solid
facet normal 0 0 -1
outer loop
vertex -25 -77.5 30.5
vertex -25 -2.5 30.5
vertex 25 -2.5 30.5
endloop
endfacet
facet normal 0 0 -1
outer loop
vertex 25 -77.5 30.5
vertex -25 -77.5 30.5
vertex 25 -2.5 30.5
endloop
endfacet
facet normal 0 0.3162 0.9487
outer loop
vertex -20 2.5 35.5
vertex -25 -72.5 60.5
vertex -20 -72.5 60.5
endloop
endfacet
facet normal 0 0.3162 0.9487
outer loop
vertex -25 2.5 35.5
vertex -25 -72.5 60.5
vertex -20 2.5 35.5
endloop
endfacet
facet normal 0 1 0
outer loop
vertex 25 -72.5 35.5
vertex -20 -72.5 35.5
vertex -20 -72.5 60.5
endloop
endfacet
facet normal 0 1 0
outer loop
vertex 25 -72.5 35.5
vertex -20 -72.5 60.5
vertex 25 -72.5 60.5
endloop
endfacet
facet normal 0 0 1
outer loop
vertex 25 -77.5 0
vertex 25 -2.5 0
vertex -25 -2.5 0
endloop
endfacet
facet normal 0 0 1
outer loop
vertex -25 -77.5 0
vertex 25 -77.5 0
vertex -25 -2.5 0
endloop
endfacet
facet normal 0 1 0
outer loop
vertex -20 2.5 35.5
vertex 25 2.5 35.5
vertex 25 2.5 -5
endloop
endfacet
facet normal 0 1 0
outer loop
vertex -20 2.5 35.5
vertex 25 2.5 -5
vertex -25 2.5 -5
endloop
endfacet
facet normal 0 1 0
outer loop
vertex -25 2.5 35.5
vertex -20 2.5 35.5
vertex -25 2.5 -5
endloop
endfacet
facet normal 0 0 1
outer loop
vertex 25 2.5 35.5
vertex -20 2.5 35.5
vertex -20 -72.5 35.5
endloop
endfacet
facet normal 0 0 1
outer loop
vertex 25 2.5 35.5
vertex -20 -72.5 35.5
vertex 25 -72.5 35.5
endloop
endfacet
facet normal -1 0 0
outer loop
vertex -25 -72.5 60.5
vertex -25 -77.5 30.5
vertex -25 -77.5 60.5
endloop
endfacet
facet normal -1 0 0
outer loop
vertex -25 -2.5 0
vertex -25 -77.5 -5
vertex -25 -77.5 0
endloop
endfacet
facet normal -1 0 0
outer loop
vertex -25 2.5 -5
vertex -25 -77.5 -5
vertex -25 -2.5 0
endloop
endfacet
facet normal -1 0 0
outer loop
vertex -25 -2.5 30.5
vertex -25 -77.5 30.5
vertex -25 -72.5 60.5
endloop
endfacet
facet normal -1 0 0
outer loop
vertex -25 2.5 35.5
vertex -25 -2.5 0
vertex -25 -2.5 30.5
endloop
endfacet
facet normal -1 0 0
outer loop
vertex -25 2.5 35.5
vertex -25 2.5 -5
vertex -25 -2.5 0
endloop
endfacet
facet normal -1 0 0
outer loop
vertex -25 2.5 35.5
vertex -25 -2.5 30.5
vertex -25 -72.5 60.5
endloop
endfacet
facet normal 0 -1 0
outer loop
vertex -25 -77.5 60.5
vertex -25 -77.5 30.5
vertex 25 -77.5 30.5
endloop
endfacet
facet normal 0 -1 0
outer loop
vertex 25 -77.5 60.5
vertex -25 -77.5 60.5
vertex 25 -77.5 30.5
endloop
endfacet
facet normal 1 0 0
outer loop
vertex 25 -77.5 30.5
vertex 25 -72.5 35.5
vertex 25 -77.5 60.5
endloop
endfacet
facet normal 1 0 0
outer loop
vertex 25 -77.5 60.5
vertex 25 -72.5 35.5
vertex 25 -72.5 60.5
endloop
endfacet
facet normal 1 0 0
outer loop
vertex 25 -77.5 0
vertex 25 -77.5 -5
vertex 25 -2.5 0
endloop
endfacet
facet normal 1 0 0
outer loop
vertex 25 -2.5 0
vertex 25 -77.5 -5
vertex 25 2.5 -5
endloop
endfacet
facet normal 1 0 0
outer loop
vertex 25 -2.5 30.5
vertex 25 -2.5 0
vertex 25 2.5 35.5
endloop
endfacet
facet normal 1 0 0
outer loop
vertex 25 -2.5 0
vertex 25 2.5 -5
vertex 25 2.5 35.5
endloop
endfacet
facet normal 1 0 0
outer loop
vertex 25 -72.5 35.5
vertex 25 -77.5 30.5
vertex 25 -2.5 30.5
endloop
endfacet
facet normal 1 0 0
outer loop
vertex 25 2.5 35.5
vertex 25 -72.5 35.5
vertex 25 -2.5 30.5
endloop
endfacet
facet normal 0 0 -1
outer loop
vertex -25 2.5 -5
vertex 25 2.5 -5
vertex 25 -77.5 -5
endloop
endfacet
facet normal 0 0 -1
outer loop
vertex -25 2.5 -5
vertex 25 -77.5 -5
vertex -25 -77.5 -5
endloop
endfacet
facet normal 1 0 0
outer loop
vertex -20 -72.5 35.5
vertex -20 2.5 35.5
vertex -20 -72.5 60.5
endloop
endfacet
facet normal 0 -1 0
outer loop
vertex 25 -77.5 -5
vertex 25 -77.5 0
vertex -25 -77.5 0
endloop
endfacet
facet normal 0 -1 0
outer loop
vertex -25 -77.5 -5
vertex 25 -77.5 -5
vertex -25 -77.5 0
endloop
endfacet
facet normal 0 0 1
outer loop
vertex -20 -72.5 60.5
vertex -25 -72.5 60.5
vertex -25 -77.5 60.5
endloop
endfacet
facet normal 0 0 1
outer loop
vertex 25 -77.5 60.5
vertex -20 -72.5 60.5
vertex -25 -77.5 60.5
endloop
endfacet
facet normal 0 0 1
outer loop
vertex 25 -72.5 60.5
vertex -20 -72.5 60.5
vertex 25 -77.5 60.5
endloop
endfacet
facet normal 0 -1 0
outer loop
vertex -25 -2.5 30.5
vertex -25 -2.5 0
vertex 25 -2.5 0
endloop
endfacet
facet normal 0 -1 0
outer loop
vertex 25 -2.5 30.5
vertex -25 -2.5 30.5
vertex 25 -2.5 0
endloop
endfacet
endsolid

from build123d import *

# Parameters (mm, degrees)
F0_W     = 25
F0_H     = 2.5
F1_DEPTH = 30.5
F2_W     = 50
F2_H     = 80
F3_DEPTH = 5
F4_W     = 50
F4_H     = 5
F5_DEPTH = 25
F7_DEPTH = 5
F8_W     = 50
F8_H     = 5
F9_DEPTH = 80


with BuildPart() as f1:
    # F0 (on Top) → F1 (new body)
    with BuildSketch(Plane.XY):
        with Locations((-12.5, 1.25)):
            Rectangle(F0_W, F0_H)
        with Locations((12.5, 1.25)):
            Rectangle(F0_W, F0_H)
        with Locations((-12.5, -1.25)):
            Rectangle(F0_W, F0_H)
        with Locations((12.5, -1.25)):
            Rectangle(F0_W, F0_H)
    extrude(amount=F1_DEPTH)

    # F2 (on face) → F3 (join)
    with BuildSketch(Plane.XY.offset(30.5)):
        with Locations((0, -37.5)):
            Rectangle(F2_W, F2_H)
    extrude(amount=F3_DEPTH)

    # F4 (on face) → F5 (join)
    with BuildSketch(Plane.XY.offset(35.5)):
        with Locations((0, -75)):
            Rectangle(F4_W, F4_H)
    extrude(amount=F5_DEPTH)

    # F6 (on face) → F7 (join)
    with BuildSketch(Plane(origin=(-25, 0, 0), x_dir=(0, -1, 0), z_dir=(-1, 0, 0))):
        Polygon((77.5, 30.5), (77.5, 60.5), (72.5, 60.5), (-2.5, 35.5), align=None)
    extrude(amount=-F7_DEPTH)

    # F8 (on face) → F9 (join, through all)
    with BuildSketch(Plane(origin=(0, 2.5, 0), x_dir=(-1, 0, 0), z_dir=(0, 1, 0))):
        with Locations((0, -2.5)):
            Rectangle(F8_W, F8_H)
    extrude(amount=-F9_DEPTH)


solid = f1.part
